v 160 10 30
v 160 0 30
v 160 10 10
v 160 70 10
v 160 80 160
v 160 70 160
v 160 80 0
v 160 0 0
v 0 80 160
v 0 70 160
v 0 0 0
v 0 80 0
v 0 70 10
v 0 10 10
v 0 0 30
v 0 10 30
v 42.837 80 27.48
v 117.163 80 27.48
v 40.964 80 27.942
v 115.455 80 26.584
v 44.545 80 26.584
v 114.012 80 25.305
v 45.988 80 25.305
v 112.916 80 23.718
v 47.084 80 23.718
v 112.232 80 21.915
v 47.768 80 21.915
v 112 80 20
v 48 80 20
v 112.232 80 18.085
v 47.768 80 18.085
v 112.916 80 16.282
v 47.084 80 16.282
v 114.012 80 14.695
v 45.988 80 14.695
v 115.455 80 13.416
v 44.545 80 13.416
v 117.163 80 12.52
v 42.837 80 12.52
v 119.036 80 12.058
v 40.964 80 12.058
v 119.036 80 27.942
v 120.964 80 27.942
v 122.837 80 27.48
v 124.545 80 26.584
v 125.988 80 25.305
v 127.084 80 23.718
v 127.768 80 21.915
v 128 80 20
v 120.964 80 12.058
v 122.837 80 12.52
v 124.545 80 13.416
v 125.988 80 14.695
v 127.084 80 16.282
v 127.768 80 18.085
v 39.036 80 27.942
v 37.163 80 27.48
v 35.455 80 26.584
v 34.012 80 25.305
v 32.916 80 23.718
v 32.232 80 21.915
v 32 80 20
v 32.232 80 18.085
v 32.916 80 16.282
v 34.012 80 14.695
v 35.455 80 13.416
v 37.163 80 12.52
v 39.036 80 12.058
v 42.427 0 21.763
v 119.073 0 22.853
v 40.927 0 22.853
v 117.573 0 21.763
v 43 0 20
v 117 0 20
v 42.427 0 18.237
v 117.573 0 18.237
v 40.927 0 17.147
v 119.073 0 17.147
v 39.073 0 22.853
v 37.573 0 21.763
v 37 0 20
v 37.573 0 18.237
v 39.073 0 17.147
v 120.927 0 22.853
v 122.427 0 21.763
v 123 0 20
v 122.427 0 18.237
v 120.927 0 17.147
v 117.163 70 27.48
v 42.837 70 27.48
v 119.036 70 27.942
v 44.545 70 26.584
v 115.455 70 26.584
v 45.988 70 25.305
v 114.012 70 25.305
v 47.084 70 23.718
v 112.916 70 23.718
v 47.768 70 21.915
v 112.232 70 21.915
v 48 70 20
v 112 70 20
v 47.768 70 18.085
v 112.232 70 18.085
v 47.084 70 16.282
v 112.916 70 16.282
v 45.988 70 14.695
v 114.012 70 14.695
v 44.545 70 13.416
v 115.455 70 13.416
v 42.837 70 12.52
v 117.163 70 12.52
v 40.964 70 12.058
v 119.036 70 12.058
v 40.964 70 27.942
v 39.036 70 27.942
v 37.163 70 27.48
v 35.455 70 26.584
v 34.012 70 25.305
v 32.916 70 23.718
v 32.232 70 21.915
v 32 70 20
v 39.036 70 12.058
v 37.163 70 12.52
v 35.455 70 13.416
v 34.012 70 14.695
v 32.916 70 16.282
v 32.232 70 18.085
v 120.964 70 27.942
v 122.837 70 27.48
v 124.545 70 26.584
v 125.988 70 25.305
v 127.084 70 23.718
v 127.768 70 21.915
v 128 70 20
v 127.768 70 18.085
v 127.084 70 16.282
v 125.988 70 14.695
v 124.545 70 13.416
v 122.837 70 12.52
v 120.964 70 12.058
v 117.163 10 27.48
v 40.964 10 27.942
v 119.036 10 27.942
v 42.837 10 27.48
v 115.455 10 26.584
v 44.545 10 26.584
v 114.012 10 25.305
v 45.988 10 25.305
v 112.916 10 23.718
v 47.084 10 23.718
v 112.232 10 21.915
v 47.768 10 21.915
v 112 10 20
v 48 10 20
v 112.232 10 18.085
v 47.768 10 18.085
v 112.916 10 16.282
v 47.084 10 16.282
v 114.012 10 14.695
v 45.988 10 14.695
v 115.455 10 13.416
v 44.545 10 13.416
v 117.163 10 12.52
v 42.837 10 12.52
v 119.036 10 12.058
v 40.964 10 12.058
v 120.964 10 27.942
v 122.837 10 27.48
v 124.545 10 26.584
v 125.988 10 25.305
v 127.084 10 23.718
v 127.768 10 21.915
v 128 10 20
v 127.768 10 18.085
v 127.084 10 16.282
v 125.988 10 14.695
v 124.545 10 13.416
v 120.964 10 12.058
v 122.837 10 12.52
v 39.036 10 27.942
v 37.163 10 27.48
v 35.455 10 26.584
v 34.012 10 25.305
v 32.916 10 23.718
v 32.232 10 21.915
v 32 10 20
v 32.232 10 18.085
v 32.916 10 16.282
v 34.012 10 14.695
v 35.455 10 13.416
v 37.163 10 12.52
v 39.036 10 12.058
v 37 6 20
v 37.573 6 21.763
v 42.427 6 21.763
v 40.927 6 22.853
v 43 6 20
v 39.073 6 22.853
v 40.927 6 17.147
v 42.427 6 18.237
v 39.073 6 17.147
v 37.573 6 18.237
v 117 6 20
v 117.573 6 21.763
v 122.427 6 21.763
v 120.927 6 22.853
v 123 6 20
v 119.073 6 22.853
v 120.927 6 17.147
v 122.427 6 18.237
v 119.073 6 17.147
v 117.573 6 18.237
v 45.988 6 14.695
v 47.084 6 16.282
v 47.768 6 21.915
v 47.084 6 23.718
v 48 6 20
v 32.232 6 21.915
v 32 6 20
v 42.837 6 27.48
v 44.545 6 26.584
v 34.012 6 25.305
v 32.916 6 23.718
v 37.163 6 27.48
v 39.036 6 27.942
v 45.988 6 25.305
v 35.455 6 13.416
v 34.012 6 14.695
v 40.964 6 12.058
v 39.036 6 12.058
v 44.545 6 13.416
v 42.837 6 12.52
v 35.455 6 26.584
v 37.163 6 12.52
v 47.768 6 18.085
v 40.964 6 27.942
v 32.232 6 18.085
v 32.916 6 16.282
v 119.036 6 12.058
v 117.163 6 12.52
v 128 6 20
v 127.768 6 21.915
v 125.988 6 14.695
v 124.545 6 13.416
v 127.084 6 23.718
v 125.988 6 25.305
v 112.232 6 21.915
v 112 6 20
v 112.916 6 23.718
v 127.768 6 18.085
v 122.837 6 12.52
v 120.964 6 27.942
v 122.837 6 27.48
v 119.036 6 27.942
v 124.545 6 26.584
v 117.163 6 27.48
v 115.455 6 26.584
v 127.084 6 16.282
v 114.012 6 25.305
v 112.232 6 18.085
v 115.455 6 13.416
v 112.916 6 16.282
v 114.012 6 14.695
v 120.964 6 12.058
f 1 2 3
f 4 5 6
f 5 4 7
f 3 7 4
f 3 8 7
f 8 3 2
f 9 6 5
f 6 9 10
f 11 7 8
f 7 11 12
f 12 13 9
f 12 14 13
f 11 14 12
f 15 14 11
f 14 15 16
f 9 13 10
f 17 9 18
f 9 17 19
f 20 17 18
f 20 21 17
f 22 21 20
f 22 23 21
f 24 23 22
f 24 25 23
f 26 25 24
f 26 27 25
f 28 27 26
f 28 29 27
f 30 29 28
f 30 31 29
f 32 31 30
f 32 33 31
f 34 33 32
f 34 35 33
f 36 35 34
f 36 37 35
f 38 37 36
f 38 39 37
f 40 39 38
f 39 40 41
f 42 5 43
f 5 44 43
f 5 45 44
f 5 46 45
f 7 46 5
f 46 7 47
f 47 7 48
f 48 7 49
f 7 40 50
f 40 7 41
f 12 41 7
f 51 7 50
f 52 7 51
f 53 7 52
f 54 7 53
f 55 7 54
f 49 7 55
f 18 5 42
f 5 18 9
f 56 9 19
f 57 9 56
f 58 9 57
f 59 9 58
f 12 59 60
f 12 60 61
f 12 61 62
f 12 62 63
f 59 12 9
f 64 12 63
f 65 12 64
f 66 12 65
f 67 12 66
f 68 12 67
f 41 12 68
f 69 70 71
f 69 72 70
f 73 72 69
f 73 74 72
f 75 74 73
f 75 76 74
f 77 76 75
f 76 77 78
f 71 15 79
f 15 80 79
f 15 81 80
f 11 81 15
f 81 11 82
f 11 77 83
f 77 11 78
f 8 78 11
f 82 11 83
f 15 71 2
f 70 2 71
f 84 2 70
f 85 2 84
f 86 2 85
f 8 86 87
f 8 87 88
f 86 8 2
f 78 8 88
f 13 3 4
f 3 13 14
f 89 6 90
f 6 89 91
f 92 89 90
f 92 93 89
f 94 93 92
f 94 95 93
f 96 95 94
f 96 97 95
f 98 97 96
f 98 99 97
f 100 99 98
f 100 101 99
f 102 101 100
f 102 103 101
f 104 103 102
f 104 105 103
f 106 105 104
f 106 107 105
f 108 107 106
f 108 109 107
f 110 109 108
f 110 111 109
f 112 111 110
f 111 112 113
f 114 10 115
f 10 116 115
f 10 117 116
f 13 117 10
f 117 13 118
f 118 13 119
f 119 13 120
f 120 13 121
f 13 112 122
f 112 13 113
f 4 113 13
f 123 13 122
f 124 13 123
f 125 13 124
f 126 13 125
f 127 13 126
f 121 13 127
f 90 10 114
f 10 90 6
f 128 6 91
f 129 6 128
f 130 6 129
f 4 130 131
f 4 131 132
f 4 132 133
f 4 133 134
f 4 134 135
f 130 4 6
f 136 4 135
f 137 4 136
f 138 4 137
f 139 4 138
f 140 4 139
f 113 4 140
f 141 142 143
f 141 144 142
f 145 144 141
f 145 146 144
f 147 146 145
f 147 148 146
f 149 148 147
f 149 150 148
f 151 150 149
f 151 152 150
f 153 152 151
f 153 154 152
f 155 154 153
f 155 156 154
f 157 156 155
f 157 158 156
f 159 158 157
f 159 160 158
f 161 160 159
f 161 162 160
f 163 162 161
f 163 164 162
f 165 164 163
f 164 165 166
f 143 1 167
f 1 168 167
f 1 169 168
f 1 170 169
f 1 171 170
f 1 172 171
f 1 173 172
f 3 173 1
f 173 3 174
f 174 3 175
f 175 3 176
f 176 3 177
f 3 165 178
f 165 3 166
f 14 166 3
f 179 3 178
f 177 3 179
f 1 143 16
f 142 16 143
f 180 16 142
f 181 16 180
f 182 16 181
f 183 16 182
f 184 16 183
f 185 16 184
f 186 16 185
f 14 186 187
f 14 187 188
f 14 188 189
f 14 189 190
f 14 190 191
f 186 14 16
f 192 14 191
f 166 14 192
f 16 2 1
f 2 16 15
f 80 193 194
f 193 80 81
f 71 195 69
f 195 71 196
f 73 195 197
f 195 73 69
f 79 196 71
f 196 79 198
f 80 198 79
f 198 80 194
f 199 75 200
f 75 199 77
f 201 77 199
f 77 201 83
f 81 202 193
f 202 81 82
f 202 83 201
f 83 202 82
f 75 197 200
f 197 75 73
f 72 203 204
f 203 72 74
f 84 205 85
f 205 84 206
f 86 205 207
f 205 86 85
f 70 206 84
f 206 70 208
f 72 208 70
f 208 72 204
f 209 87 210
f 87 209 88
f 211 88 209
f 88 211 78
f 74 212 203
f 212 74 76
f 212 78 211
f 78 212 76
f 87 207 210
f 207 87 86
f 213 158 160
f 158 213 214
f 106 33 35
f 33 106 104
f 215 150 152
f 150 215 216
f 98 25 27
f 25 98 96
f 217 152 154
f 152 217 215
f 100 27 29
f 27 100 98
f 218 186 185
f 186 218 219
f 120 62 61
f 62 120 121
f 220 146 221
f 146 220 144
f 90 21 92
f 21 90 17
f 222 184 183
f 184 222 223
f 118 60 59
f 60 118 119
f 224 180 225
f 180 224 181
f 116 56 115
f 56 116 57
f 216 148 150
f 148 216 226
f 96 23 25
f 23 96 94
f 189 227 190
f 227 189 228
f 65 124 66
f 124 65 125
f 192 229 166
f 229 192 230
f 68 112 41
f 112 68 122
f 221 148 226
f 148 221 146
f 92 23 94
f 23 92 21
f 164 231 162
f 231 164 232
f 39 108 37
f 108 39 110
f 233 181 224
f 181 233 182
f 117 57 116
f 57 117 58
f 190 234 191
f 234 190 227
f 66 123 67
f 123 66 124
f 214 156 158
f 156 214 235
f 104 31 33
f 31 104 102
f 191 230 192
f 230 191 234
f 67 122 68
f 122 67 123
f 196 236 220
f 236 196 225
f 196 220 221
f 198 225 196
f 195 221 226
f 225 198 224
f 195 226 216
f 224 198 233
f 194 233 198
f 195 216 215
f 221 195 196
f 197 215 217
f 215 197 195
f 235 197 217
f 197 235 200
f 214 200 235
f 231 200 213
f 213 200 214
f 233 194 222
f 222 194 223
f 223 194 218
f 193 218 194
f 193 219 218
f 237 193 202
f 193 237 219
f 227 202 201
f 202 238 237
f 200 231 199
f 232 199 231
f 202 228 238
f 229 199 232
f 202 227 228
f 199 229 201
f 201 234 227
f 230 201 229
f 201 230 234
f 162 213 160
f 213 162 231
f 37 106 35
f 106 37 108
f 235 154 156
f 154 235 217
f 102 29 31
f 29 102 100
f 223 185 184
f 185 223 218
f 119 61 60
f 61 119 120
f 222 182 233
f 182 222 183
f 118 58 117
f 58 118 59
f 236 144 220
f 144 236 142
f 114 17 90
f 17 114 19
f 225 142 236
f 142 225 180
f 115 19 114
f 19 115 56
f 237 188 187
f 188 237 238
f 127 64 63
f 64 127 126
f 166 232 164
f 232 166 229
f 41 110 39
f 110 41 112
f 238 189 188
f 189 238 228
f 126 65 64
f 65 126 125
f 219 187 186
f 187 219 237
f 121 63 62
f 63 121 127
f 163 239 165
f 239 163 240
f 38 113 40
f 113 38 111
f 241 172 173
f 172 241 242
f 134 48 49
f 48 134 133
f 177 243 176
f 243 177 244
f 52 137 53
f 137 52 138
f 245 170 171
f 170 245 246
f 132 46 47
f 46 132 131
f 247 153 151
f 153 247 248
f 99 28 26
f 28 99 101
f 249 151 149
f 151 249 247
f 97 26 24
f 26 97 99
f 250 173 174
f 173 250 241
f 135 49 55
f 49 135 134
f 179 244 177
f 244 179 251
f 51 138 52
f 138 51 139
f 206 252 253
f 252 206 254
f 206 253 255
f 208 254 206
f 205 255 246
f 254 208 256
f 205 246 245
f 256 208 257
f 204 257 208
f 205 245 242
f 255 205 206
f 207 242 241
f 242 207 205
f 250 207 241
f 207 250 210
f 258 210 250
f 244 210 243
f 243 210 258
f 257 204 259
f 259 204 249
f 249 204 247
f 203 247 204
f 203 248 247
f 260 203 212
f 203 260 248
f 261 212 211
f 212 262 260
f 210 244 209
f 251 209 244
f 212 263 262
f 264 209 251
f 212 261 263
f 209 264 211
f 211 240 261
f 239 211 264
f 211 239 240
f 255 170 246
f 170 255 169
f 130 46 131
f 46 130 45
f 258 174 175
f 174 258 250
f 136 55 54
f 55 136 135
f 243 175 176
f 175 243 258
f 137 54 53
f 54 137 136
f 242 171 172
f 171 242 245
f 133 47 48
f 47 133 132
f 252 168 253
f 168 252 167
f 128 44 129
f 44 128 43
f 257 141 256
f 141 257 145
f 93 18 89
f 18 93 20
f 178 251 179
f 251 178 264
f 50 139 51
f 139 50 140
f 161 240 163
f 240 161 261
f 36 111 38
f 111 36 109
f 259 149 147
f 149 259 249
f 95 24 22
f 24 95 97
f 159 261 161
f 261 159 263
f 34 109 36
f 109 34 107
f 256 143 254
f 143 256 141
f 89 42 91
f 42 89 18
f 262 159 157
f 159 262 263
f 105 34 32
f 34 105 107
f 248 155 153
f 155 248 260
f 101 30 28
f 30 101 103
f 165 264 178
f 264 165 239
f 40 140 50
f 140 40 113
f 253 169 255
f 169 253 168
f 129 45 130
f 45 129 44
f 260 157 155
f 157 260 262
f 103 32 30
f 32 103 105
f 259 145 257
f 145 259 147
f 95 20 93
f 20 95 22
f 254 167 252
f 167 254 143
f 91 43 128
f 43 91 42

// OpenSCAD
difference()
{
  cube([160,80,160]);
  translate([-5,10,10]) cube([220,60,170]);
  translate([-5,-5,30]) cube([220,30,170]);
  translate([40,15,20]) rotate([90,0,0]) cylinder(d=6,h=30);
  translate([120,15,20]) rotate([90,0,0]) cylinder(d=6,h=30);
  translate([40,86,20]) rotate([90,0,0]) cylinder(d=16,h=80);
  translate([120,86,20]) rotate([90,0,0]) cylinder(d=16,h=80);
}
